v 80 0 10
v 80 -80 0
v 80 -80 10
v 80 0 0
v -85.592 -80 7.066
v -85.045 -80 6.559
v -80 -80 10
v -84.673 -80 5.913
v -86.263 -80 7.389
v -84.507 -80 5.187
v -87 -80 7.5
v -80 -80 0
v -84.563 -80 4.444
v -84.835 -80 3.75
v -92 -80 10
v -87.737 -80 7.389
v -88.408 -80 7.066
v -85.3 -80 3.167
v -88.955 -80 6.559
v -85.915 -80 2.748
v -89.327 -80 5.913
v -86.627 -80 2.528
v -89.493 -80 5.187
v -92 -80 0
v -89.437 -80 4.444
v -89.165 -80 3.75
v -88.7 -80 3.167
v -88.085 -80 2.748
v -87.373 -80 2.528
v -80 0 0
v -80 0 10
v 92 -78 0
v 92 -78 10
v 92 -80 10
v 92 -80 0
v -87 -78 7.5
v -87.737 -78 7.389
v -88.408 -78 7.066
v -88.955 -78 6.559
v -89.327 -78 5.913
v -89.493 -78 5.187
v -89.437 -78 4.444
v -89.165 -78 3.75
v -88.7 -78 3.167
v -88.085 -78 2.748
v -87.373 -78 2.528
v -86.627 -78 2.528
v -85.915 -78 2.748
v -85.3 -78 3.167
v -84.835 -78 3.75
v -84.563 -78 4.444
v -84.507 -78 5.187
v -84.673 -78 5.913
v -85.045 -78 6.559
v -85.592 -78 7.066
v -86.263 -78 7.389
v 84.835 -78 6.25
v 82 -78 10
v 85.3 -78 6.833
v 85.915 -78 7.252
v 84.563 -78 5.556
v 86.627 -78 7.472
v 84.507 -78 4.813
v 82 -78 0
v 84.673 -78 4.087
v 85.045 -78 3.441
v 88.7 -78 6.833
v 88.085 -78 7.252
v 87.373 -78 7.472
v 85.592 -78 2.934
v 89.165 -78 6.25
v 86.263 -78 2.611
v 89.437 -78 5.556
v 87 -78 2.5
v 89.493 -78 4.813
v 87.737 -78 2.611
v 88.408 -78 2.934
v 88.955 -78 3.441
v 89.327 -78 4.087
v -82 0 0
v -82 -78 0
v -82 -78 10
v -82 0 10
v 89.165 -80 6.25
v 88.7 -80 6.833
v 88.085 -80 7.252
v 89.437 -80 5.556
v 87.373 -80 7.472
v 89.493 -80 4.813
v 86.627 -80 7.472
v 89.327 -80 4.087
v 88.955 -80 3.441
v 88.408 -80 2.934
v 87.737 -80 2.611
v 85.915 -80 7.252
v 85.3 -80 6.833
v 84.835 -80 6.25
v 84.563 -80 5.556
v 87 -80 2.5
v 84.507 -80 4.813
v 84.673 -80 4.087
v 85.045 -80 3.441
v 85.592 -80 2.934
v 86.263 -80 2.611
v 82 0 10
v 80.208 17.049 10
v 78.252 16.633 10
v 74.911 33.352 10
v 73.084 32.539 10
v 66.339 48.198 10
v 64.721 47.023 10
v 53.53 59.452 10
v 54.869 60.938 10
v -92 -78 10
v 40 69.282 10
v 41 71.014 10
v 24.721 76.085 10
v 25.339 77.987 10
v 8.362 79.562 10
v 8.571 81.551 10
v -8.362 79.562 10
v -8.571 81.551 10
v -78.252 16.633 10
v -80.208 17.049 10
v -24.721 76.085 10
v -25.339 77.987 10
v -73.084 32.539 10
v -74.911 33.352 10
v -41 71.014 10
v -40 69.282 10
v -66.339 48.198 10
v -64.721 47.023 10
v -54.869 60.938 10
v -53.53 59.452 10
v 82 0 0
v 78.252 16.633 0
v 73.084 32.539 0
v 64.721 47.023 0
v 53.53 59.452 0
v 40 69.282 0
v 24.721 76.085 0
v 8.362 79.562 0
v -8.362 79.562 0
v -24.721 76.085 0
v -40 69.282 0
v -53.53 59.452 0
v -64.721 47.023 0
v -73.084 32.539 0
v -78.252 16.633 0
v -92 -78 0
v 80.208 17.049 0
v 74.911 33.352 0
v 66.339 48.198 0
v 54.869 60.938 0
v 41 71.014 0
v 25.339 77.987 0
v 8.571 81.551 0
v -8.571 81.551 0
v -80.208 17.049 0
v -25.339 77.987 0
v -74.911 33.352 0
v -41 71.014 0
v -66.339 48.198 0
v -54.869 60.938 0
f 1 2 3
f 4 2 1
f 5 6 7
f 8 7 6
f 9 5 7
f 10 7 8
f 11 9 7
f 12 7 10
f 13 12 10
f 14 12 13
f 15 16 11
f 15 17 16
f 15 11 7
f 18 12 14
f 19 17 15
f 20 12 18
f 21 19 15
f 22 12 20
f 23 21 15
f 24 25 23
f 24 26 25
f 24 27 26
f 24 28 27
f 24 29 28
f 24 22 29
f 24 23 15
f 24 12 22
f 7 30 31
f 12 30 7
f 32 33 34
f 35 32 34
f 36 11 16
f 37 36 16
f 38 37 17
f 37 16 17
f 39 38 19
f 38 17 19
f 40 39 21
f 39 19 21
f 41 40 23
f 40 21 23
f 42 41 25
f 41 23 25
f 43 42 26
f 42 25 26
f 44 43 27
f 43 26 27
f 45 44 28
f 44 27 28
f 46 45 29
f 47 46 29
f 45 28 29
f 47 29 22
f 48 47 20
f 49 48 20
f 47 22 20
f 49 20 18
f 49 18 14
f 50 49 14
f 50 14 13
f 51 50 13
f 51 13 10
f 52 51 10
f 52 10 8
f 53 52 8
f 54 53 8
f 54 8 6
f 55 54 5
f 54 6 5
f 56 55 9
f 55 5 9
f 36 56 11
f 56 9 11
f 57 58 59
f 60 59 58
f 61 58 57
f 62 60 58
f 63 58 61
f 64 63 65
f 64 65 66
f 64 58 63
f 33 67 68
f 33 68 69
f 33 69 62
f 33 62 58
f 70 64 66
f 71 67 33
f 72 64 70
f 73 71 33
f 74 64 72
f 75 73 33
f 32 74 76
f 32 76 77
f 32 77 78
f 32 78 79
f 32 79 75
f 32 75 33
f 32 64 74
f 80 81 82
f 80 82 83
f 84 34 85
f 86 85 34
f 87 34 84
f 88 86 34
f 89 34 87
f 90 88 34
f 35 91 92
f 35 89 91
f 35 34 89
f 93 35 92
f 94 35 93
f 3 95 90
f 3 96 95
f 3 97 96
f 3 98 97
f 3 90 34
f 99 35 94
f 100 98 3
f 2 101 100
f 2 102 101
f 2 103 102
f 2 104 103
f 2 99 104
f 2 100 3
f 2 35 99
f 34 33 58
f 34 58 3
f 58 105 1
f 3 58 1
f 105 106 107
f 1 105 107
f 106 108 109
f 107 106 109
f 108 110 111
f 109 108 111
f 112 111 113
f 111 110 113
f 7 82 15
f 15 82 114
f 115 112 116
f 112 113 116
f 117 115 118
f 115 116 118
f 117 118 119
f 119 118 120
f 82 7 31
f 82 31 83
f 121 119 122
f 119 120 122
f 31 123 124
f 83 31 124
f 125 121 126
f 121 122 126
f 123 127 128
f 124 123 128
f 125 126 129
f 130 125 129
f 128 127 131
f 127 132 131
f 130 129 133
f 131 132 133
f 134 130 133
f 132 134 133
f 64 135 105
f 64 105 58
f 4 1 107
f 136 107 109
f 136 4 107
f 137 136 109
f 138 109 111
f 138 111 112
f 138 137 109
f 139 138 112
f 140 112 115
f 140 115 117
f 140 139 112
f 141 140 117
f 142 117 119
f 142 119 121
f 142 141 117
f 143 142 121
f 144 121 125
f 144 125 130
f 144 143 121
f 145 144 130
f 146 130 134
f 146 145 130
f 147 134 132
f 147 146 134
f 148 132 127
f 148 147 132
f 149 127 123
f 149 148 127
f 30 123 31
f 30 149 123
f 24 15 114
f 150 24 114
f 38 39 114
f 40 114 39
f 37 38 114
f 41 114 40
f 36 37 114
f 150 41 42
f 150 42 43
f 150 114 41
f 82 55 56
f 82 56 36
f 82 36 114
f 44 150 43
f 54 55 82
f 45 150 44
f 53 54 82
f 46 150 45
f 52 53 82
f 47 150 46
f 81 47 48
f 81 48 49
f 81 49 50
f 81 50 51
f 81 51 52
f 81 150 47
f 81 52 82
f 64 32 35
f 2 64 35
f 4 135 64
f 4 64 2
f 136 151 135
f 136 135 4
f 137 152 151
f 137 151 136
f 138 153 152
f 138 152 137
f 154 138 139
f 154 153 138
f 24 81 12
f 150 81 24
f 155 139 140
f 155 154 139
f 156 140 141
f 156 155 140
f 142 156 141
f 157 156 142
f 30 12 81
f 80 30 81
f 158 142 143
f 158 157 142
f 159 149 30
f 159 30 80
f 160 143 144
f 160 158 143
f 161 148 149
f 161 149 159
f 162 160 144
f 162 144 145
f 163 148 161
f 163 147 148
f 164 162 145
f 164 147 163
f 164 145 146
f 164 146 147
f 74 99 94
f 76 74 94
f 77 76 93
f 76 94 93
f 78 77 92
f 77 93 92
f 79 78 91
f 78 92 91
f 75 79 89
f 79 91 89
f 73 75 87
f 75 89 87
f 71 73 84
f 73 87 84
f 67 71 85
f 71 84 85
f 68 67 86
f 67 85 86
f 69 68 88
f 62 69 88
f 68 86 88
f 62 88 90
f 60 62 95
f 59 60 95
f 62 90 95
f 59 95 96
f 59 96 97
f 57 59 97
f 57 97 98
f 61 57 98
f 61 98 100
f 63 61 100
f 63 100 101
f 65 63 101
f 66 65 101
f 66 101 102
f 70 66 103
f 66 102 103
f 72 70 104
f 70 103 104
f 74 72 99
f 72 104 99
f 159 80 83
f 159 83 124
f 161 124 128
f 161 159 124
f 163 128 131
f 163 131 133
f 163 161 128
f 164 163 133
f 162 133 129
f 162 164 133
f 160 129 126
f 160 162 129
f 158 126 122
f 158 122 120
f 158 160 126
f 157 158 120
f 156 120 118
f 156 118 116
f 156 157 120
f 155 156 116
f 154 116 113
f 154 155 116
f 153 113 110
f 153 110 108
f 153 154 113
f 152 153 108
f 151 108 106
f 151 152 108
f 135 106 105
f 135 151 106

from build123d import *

# Parameters (mm, degrees)
Y_KSEKLIK_EKSTR_ZYON2_DEPTH = 10
IZIM2_R                     = 2.5
KES_EKSTR_ZYON1_DEPTH       = 2


with BuildPart() as part:
    # Çizim1 → Yükseklik-Ekstrüzyon2 (new body)
    with BuildSketch(Plane.XY):
        with BuildLine():
            Line((-80, 0), (-80, -80))
            Line((-80, -80), (-92, -80))
            Line((-92, -80), (-92, -78))
            Line((-92, -78), (-82, -78))
            Line((-82, -78), (-82, 0))
            ThreePointArc((-82, 0), (0, 82), (82, 0))
            Line((82, 0), (82, -78))
            Line((82, -78), (92, -78))
            Line((92, -78), (92, -80))
            Line((92, -80), (80, -80))
            Line((80, -80), (80, 0))
            ThreePointArc((80, 0), (0, 80), (-80, 0))
        make_face()
    extrude(amount=Y_KSEKLIK_EKSTR_ZYON2_DEPTH)

    # Çizim2 → Kes-Ekstrüzyon1 (cut)
    with BuildSketch(Plane.XZ.offset(80)):
        with Locations(Location((87, 5, 0), (0, 0, 270))):
            Circle(IZIM2_R)
        with Locations(Location((-87, 5, 0), (0, 0, 90))):
            Circle(IZIM2_R)
    extrude(amount=-KES_EKSTR_ZYON1_DEPTH, mode=Mode.SUBTRACT)


solid = part.part
